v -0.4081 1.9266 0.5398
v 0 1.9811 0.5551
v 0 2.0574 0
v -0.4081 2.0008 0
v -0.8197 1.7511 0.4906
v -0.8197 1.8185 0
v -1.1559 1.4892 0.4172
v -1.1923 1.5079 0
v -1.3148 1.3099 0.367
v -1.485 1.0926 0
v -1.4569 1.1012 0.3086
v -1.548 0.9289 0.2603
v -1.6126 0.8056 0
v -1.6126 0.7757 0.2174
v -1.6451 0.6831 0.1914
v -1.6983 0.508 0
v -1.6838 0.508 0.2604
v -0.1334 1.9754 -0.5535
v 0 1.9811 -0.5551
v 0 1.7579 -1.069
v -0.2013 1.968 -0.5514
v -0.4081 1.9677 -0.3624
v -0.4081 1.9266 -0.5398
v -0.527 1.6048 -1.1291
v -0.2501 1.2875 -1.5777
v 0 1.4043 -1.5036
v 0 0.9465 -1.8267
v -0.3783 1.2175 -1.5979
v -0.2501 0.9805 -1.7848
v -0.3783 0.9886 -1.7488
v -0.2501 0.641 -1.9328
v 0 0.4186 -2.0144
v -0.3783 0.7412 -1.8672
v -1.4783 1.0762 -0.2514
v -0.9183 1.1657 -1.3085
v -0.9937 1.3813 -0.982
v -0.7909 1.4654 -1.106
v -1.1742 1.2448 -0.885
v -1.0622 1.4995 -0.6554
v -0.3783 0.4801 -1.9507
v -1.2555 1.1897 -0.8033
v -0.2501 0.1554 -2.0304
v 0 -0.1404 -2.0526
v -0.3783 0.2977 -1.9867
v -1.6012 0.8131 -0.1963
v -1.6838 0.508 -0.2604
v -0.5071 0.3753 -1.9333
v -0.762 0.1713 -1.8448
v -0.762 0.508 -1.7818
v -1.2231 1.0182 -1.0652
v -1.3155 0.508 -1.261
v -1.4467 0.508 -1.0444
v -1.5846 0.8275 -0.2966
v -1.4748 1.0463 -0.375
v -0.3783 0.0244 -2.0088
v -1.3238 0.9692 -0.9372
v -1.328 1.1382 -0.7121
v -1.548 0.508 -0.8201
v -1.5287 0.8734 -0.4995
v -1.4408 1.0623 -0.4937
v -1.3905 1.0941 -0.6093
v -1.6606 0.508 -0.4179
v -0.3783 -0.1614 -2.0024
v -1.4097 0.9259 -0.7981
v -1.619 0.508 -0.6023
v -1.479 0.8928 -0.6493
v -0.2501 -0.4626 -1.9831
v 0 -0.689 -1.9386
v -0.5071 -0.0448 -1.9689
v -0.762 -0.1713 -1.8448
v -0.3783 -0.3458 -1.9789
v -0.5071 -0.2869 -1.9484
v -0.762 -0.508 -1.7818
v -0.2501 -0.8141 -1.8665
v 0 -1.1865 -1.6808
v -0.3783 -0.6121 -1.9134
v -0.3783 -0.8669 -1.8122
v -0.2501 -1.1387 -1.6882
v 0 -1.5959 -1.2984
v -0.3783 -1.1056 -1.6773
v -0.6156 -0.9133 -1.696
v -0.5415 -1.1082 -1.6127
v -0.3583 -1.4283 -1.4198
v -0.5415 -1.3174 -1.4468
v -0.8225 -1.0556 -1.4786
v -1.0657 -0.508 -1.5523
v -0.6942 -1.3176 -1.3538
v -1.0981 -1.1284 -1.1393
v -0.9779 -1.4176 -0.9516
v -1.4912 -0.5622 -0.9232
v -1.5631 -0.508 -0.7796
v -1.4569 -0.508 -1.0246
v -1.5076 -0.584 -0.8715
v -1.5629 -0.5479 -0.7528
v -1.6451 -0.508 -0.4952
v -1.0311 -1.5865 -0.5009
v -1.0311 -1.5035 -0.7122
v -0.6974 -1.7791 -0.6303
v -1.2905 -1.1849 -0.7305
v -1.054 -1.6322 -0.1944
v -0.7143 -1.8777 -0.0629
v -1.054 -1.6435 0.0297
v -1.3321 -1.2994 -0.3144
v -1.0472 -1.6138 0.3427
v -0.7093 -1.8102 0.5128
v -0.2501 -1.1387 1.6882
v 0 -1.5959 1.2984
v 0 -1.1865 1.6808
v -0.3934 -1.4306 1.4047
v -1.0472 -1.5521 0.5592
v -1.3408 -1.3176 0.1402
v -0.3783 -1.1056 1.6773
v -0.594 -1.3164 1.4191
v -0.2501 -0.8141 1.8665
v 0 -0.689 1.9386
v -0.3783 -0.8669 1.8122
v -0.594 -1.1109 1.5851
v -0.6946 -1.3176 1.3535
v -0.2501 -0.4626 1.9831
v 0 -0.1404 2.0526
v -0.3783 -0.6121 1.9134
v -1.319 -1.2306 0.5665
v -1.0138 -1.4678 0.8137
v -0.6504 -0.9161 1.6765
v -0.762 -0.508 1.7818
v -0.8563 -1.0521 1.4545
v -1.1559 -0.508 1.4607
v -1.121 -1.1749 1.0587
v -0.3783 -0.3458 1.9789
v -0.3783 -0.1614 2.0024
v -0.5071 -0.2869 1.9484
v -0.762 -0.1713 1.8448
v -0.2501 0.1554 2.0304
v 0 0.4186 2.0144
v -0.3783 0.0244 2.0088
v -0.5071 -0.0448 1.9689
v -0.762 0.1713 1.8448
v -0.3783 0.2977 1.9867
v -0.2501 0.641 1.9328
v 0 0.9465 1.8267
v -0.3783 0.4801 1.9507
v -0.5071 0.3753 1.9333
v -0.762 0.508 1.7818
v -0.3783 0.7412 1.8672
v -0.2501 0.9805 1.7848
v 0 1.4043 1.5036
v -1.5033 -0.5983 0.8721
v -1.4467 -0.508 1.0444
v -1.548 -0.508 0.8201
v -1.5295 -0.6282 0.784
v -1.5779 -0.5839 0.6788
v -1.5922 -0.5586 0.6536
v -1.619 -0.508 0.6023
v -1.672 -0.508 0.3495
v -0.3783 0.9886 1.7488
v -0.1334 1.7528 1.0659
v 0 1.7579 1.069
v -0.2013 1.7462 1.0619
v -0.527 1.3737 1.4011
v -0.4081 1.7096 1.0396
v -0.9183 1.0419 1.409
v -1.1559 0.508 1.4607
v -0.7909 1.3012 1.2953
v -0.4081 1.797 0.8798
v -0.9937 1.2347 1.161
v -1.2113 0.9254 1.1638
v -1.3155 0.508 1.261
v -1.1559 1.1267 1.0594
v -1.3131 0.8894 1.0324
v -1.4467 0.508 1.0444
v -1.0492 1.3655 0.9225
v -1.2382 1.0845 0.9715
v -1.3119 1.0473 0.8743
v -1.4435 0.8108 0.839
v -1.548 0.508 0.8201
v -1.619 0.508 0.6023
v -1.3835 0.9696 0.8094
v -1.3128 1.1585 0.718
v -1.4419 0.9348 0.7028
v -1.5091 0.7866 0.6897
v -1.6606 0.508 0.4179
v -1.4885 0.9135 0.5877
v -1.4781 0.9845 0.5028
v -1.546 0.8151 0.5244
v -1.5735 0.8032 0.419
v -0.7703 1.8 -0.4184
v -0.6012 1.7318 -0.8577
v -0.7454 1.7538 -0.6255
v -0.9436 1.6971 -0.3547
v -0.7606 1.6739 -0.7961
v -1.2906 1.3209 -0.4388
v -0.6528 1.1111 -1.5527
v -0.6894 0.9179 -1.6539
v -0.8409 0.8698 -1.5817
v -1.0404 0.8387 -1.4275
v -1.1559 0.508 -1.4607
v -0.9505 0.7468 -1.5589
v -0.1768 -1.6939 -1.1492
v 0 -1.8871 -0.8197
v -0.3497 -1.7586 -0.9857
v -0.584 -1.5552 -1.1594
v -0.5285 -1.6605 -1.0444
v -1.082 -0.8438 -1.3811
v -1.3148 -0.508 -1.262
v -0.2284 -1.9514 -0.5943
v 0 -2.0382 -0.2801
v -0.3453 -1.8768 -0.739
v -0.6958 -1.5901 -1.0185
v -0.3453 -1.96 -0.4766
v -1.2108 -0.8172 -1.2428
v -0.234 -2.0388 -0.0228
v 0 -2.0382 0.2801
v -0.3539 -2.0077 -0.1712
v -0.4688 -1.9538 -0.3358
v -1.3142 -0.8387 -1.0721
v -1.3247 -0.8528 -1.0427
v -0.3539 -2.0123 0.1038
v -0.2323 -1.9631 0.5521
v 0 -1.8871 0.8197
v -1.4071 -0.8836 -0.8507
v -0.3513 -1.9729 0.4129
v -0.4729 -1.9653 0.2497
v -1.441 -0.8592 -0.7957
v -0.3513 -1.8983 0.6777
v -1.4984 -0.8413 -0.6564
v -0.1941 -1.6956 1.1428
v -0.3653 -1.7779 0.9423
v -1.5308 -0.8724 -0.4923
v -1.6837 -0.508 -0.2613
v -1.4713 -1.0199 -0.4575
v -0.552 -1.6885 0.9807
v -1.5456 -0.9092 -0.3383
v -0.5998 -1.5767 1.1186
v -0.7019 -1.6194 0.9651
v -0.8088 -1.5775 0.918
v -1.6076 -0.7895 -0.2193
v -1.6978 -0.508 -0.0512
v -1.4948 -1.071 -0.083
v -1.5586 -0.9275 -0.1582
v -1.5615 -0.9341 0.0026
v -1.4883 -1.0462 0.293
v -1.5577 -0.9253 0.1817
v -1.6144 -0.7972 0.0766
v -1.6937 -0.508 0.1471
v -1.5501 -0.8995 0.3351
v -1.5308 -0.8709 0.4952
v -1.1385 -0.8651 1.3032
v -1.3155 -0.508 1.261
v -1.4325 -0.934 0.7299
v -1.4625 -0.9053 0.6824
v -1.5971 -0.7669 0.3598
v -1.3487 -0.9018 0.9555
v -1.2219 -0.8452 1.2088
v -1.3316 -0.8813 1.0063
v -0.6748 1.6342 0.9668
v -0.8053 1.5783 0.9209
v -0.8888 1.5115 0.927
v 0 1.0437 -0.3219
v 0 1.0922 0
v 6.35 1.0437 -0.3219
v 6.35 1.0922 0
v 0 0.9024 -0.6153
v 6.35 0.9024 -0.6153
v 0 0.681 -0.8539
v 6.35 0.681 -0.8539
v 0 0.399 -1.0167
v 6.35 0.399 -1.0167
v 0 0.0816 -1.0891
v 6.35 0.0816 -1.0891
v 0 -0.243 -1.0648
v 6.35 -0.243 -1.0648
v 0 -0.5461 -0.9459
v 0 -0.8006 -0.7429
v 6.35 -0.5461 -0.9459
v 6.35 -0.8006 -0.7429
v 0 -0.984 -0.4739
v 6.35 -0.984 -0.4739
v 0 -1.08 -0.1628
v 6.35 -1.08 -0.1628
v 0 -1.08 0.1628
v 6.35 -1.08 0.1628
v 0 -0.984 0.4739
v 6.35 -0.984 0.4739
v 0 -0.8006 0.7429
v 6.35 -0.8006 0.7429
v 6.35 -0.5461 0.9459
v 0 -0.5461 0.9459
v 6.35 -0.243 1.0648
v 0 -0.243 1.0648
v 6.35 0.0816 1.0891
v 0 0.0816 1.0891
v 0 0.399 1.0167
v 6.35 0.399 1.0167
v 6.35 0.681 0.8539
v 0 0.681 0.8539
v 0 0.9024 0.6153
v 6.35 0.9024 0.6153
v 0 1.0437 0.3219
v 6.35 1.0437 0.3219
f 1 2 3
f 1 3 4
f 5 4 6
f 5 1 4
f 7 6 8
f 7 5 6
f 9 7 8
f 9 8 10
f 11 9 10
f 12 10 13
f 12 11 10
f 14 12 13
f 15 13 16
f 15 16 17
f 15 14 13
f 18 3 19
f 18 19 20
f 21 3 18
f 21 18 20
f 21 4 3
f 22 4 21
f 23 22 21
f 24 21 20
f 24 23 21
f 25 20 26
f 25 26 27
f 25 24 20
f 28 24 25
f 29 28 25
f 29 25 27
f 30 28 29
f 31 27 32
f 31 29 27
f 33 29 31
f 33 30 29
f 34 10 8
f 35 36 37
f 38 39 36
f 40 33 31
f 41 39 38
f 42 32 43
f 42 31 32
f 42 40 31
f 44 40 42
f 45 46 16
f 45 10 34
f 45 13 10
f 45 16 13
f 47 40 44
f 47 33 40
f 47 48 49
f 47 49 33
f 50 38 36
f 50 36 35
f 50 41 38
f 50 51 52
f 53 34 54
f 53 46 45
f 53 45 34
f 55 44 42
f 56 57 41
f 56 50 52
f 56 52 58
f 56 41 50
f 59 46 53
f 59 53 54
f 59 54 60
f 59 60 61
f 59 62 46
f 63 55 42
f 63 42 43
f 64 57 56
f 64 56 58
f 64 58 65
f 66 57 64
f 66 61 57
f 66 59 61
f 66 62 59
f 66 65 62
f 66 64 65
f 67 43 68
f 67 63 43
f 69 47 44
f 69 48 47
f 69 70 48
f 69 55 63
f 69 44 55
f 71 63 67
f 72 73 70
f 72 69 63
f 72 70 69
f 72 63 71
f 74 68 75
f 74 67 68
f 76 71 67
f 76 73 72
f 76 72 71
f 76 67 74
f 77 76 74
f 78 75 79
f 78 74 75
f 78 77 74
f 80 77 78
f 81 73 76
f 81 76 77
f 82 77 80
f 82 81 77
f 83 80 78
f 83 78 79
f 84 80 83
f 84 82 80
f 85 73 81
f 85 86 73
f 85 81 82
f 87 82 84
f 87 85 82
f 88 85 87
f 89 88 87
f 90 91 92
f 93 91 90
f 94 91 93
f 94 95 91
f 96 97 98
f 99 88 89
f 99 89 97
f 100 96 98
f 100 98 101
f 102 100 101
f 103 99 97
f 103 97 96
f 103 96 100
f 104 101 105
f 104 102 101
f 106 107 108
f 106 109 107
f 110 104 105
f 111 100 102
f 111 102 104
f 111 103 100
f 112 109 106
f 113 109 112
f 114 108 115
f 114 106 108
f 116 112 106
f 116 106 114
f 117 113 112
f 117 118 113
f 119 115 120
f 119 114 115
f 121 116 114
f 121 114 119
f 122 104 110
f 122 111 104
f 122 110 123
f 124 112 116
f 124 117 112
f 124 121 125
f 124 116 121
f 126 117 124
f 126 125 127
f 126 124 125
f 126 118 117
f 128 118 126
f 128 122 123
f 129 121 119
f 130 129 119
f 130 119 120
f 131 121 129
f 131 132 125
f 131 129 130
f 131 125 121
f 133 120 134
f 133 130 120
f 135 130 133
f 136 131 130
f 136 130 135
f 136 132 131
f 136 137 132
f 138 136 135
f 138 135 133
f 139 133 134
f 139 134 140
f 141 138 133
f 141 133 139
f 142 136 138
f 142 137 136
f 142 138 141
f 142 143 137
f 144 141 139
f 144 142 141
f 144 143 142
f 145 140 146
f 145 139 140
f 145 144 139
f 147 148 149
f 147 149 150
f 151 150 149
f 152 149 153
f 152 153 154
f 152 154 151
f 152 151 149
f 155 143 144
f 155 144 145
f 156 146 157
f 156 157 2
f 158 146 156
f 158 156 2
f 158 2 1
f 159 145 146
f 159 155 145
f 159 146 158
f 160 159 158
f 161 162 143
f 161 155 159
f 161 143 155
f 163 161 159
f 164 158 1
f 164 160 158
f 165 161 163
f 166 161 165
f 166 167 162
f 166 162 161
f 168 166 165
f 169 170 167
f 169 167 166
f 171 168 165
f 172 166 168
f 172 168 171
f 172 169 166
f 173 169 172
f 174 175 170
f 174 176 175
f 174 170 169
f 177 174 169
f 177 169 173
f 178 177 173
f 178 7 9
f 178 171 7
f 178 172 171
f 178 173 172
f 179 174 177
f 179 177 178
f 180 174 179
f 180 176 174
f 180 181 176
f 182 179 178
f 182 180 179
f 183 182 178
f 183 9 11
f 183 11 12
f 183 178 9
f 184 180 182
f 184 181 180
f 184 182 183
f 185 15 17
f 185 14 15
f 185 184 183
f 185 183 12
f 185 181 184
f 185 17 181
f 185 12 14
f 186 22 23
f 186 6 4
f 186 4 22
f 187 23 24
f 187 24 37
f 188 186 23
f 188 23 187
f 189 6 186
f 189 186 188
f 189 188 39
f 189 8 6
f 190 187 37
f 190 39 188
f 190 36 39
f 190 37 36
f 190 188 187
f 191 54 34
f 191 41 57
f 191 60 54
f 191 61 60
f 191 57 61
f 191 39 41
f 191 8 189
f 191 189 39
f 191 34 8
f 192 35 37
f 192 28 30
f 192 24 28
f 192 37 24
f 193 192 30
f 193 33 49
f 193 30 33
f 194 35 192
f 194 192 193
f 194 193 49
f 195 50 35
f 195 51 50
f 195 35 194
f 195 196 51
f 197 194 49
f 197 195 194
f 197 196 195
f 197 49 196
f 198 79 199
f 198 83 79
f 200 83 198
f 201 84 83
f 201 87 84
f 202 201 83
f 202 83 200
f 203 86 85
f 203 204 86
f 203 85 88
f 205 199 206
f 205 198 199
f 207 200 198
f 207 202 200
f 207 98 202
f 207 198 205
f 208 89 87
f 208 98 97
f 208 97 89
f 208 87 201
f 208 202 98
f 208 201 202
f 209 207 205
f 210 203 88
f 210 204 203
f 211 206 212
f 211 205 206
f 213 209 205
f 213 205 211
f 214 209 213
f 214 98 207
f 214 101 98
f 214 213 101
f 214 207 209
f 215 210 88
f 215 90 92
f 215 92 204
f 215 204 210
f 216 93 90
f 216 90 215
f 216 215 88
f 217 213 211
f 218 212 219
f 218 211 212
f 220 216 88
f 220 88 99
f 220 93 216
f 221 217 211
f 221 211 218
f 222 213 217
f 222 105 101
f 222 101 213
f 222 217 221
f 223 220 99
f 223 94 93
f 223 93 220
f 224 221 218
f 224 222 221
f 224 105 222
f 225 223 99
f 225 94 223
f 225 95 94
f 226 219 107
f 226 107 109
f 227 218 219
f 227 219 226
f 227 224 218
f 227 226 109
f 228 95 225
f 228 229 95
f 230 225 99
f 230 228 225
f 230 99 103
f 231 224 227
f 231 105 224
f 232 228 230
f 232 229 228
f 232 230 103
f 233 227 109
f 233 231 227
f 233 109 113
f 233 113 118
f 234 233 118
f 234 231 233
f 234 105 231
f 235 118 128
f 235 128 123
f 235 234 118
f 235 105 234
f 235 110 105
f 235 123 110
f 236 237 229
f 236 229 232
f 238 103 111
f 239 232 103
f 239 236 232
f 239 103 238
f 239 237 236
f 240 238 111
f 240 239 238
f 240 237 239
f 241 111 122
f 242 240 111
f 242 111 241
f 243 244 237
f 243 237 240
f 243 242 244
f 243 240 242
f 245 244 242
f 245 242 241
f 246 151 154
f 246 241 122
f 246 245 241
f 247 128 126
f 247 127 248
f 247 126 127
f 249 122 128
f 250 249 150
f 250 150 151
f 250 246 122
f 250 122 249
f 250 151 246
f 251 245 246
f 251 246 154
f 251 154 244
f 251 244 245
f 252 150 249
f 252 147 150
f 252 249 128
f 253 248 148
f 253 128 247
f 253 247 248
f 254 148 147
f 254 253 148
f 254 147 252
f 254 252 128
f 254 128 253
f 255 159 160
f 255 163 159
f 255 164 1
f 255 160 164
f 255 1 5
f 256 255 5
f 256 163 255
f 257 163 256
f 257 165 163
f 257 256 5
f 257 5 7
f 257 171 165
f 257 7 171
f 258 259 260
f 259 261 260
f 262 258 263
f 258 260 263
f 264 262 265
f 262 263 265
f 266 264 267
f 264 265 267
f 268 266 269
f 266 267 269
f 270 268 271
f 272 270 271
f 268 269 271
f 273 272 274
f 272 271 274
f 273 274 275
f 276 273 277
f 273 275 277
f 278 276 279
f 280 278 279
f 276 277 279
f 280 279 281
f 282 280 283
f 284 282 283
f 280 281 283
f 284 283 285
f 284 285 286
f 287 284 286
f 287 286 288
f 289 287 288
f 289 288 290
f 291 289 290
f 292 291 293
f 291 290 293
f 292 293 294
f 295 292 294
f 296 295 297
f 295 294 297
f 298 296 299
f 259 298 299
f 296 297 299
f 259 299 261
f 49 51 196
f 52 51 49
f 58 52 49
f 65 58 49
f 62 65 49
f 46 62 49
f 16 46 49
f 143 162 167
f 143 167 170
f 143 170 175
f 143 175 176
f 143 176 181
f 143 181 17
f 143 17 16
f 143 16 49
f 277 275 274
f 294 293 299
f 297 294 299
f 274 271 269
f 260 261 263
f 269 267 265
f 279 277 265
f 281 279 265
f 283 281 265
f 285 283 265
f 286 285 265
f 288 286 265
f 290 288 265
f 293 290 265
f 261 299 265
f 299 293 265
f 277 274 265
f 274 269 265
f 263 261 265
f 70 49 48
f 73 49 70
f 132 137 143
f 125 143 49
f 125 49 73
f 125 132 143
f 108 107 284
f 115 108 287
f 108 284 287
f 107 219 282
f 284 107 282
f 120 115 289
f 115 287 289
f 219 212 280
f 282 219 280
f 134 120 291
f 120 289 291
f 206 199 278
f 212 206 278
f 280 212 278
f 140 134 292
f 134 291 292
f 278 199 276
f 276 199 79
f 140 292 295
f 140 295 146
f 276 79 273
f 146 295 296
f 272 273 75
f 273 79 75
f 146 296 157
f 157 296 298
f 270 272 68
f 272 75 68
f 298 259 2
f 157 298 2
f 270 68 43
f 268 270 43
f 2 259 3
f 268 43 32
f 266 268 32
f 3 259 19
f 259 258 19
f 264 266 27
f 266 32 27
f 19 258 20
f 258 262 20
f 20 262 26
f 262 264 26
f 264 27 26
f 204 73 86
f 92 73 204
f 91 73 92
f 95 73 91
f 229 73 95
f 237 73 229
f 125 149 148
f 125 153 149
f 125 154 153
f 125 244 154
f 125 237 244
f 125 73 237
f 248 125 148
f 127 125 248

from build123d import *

# Parameters (mm, degrees)
CUT_EXTRUDE1_DEPTH      = 2.54
CUT_EXTRUDE1_DEPTH_BACK = 2.54


with BuildPart() as part:
    # Sketch2 → Revolve1 (revolve)
    with BuildSketch(Plane.XY):
        with BuildLine():
            Line((0, 2.0574), (0, 1.0922))
            Line((0, 1.0922), (6.35, 1.0922))
            Line((6.35, 1.0922), (6.35, 0))
            Line((6.35, 0), (0, 0))
            Line((0, 0), (-1.7526, 0))
            add(Edge.make_bspline(
                [(0, 2.0574), (-1.7526, 2.0574), (-1.7526, 0)],
                knots=[3.141592654, 3.141592654, 3.141592654, 4.71238898, 4.71238898, 4.71238898], degree=2, weights=[1, 0.707106781, 1]))
        make_face()
    revolve(axis=Axis((6.35, 0, 0), (-1, 0, 0)))

    # 3DSketch1 → Cut-Extrude1 (cut, two sides: drawn at the far end of the back side and taken through both)
    with BuildSketch(Plane(origin=(-0.762, 0.508, 0), x_dir=(-0.9284766908852594, -0.37139067635410355, 0), z_dir=(0, 0, 1)).offset(-CUT_EXTRUDE1_DEPTH_BACK)):
        Polygon((0, 0), (0.377332927, 0.943332318), (2.735663722, 0), (2.358330795, -0.943332318), align=None)
    extrude(amount=CUT_EXTRUDE1_DEPTH + CUT_EXTRUDE1_DEPTH_BACK, mode=Mode.SUBTRACT)


solid = part.part
